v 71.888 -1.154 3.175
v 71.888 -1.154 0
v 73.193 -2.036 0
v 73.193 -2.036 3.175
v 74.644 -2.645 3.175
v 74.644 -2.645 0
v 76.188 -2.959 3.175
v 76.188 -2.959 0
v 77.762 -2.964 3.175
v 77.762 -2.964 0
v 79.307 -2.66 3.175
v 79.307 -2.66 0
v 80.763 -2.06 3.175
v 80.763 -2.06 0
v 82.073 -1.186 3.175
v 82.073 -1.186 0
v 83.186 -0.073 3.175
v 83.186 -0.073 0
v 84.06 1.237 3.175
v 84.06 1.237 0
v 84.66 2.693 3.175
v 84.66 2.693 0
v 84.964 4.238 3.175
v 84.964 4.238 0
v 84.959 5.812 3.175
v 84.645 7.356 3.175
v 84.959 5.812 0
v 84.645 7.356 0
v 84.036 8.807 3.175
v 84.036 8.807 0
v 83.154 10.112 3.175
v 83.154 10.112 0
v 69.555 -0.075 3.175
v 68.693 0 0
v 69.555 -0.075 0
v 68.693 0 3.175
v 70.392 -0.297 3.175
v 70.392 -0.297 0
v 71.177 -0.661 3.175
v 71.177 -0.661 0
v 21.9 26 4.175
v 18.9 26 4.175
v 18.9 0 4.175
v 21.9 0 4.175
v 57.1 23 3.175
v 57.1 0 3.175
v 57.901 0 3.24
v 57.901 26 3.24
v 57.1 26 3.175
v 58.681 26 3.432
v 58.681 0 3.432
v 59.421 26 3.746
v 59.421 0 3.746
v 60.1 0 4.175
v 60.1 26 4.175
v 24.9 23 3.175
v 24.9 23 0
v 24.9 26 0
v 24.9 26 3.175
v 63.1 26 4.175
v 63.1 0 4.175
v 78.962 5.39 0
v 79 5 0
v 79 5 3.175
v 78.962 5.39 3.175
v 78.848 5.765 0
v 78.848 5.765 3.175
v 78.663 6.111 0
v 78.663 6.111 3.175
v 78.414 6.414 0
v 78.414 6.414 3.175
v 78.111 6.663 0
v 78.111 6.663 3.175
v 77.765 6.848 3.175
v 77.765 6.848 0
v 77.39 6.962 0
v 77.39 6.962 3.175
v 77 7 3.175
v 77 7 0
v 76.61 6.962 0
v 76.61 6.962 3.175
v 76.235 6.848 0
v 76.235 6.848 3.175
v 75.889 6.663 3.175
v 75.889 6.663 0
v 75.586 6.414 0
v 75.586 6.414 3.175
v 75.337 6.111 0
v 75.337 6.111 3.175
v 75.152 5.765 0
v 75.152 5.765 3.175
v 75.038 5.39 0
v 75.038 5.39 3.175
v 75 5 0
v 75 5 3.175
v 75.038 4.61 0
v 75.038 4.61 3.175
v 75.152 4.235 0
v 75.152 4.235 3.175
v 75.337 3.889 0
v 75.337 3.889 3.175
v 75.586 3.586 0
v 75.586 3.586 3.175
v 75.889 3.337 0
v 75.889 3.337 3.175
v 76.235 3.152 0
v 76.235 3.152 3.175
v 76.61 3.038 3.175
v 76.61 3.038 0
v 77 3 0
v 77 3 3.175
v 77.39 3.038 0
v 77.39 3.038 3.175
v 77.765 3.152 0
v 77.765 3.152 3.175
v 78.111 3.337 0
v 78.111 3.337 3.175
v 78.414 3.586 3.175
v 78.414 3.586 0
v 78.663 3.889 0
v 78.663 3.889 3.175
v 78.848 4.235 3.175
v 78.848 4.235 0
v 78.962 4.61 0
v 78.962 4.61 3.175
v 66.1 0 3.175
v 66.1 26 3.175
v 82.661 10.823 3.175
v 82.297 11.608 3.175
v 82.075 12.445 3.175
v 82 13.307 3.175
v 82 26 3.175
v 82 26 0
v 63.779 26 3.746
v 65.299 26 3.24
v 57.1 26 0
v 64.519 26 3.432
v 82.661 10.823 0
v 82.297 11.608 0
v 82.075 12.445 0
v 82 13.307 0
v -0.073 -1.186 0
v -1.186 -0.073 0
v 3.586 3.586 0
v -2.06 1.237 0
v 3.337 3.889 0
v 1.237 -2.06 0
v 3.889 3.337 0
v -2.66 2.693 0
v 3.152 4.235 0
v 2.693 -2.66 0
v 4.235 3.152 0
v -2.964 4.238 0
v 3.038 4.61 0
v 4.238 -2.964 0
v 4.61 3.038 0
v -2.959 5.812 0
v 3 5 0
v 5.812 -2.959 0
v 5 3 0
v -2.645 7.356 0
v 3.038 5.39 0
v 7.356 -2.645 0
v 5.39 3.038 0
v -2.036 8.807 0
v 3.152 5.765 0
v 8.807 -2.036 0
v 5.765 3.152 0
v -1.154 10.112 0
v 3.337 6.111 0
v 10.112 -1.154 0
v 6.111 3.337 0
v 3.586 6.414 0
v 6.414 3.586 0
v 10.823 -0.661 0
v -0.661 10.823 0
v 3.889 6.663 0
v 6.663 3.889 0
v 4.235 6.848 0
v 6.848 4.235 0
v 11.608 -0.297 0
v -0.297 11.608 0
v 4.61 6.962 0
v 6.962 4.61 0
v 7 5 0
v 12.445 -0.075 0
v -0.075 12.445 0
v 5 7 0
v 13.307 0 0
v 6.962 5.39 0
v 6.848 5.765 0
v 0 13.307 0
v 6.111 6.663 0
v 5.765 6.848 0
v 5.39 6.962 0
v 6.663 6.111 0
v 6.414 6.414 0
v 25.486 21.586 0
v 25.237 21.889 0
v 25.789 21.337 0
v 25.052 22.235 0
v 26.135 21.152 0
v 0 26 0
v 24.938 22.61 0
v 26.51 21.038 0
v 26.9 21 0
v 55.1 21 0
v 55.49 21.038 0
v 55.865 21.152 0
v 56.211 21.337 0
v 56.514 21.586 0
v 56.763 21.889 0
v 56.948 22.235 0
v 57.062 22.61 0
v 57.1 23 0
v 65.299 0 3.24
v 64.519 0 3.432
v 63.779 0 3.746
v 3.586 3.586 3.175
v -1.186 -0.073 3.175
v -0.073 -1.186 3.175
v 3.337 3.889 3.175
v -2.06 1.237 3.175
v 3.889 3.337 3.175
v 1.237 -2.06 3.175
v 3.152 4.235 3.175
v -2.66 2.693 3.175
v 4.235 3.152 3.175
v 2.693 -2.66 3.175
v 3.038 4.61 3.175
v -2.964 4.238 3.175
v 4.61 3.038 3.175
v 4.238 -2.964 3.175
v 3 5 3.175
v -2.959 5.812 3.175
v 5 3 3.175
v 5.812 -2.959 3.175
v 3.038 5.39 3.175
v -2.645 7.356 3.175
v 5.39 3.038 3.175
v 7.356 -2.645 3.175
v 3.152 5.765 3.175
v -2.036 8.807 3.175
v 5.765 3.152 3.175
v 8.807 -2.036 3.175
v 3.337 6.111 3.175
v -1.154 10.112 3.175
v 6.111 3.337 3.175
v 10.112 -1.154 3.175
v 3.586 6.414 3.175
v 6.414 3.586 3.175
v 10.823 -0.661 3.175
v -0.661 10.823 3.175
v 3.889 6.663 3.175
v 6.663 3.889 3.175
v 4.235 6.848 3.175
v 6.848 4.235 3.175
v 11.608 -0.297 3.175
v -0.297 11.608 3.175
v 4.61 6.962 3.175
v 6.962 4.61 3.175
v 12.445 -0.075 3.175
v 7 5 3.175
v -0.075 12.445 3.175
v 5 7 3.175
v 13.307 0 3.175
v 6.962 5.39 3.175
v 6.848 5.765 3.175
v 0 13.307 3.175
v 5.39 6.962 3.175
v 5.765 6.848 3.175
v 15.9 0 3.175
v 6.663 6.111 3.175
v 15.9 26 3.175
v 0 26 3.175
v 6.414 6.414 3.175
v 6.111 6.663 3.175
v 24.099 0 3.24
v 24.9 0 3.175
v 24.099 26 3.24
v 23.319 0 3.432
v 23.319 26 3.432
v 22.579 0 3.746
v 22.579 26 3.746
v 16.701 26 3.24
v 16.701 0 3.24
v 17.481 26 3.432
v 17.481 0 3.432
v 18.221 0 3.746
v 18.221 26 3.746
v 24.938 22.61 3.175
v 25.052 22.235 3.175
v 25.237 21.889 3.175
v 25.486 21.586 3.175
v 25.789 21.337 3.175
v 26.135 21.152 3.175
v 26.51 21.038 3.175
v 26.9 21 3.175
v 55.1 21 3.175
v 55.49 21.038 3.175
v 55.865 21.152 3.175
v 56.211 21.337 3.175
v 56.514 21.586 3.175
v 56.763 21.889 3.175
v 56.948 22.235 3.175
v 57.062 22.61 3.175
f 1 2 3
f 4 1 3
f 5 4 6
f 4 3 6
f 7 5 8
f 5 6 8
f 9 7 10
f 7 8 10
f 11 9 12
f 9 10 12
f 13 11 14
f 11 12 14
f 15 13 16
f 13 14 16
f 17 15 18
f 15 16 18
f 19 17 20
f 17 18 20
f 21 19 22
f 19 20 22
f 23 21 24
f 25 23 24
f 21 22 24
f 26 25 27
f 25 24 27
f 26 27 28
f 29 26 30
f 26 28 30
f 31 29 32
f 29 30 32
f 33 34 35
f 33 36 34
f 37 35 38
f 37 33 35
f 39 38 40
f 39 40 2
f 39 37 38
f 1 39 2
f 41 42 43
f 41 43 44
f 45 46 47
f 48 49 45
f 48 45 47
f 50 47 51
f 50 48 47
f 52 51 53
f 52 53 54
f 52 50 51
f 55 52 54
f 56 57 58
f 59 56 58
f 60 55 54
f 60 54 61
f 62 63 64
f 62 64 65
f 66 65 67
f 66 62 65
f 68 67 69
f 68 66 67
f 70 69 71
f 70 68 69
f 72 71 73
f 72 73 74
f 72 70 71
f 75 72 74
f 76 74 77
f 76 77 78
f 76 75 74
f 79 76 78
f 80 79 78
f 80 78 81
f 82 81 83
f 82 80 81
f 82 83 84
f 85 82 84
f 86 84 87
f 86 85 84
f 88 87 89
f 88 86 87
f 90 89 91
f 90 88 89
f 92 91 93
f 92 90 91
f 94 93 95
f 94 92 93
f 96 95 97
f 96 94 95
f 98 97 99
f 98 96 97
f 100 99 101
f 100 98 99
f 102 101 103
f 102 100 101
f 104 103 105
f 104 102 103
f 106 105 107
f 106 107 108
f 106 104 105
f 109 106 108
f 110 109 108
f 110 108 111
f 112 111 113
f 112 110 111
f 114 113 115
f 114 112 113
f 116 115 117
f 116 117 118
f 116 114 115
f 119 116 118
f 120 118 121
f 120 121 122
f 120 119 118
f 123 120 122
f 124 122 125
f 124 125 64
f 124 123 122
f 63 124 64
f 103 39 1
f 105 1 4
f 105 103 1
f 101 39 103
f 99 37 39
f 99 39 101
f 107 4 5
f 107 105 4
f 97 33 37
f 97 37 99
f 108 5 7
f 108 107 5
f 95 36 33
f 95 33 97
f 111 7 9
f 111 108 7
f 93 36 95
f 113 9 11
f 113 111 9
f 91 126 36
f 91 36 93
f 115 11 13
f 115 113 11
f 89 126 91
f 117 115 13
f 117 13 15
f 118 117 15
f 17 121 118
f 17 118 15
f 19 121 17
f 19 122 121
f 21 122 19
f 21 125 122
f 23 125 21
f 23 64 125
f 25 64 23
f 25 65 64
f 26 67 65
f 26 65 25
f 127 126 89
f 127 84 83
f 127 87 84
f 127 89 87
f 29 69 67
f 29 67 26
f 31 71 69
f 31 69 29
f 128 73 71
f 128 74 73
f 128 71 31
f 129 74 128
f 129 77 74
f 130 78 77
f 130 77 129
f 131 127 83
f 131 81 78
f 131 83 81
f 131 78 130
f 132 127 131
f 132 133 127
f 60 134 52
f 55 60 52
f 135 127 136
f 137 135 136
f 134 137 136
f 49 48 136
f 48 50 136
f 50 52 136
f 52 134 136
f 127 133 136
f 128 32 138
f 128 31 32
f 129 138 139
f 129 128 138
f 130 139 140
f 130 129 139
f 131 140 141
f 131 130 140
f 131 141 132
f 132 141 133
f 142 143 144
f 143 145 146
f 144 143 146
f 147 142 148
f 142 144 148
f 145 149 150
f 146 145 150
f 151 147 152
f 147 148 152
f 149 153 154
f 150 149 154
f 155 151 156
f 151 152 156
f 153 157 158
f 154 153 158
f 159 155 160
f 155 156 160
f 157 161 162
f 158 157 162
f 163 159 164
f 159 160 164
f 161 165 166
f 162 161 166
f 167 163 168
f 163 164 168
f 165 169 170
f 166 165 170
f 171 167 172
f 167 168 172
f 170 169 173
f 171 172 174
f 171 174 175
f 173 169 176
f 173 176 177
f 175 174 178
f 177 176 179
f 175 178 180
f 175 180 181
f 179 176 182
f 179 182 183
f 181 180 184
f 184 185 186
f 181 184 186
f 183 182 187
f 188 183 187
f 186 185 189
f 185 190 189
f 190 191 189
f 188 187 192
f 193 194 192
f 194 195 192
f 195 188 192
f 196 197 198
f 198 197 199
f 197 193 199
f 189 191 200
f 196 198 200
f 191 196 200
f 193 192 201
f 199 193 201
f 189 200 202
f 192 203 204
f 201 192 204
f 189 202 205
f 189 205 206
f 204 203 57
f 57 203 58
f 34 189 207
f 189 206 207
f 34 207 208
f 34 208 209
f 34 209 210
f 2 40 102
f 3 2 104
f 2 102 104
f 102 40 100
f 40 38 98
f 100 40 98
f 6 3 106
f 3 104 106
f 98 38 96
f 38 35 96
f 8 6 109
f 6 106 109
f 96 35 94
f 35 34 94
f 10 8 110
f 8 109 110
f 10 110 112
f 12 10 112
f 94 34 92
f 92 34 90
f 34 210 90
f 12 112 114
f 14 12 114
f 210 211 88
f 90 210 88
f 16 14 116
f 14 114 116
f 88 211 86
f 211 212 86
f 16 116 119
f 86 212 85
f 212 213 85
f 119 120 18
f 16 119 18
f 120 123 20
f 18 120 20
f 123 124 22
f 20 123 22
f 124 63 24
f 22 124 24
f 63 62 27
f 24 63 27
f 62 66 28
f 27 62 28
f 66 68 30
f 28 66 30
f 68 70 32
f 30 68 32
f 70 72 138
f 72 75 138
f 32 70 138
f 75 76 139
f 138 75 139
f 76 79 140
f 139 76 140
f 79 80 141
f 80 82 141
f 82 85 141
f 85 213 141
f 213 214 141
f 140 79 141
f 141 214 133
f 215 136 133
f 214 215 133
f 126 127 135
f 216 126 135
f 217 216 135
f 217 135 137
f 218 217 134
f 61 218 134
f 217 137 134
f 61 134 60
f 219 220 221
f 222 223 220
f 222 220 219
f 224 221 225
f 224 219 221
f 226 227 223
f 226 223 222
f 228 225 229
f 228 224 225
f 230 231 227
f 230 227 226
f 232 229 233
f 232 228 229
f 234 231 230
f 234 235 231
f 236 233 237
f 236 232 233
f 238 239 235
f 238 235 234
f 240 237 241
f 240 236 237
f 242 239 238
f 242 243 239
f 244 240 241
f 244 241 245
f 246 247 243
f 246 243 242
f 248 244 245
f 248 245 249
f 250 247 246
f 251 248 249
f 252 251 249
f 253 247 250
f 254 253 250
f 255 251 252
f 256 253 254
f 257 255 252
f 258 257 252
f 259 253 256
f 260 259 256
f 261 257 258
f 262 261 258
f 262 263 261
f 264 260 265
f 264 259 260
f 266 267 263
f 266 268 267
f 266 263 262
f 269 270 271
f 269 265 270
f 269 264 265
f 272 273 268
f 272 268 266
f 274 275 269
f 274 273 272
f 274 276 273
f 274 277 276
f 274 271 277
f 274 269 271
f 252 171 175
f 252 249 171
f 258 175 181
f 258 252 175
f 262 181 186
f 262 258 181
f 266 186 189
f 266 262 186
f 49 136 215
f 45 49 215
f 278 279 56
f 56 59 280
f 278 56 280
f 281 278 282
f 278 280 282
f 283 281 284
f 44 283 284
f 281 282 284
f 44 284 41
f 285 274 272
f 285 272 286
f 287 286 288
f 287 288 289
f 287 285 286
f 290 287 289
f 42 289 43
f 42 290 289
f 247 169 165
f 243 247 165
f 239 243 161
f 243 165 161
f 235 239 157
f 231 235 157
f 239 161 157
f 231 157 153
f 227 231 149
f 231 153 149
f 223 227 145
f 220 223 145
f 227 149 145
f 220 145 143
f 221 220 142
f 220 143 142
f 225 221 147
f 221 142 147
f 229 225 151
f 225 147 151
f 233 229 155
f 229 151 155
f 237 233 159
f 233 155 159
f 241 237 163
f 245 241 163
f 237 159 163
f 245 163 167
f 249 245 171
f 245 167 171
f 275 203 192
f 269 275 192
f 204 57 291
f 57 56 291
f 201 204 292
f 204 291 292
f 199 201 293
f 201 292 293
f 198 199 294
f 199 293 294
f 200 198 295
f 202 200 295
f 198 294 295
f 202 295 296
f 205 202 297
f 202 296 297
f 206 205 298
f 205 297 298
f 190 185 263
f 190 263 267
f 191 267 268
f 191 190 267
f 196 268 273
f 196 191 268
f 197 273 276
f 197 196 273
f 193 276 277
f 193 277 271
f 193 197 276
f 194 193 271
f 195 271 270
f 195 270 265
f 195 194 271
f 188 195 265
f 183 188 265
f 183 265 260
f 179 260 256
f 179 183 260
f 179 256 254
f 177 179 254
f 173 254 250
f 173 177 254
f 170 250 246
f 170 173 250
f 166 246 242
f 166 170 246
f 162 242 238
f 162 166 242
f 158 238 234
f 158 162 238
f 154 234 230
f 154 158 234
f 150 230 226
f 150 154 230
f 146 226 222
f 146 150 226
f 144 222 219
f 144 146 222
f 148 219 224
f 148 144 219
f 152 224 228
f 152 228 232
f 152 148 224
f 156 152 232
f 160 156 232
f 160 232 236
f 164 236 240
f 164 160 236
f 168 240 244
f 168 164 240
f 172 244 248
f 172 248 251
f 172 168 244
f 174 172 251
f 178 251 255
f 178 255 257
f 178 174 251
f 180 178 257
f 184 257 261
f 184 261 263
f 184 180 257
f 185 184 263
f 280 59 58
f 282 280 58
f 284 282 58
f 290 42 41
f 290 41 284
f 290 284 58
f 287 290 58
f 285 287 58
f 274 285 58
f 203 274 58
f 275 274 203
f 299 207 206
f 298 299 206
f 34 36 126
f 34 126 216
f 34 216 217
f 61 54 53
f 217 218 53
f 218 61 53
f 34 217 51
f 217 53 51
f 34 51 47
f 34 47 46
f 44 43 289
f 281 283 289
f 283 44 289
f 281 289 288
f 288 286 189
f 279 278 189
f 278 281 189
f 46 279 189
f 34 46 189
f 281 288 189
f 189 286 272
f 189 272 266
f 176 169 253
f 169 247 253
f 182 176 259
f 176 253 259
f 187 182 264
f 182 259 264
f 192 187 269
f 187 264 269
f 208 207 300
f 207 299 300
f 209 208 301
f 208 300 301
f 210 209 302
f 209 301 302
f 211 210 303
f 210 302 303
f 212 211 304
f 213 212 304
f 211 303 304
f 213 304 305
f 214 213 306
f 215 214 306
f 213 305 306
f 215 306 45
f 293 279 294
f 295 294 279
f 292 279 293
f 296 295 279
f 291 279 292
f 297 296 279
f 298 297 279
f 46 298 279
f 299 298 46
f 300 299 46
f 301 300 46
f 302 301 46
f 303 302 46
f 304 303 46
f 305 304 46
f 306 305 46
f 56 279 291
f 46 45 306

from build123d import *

# Parameters (mm, degrees)
F0_R        = 2
F1_DEPTH    = 3.175
F2_R        = 5
F3_R        = 2
F4_W        = 3
F4_H        = 26
F5_DEPTH    = 1
F6_T1_DEPTH = 26


# Not quite as in the source:
# - a fillet or chamfer that OpenCascade refuses, or shapes differently, is made with other operations: its cross-section is extruded or revolved along the edge and cut away or added


with BuildPart() as f1:
    # F0 (on Top) → F1 (new body)
    with BuildSketch(Plane.XY):
        with BuildLine():
            Line((11.2449979984, 0), (0, 0))
            Line((0, 0), (0, 11.2449979984))
            ThreePointArc((0, 11.2449979984), (-0.6568542495, -0.6568542495), (11.2449979984, 0))
        make_face()
        Polygon((0, 11.2449979984), (0, 0), (11.2449979984, 0), (41, 0), (70.7550020016, 0), (82, 0), (82, 11.2449979984), (82, 26), (57.1, 26), (57.1, 21), (41, 21), (24.9, 21), (24.9, 26), (0, 26), align=None)
        with Locations((5, 5)):
            Circle(F0_R, mode=Mode.SUBTRACT)
        with Locations((77, 5)):
            Circle(F0_R, mode=Mode.SUBTRACT)
        with BuildLine():
            Line((82, 0), (70.7550020016, 0))
            ThreePointArc((70.7550020016, 0), (82.6568542495, -0.6568542495), (82, 11.2449979984))
            Line((82, 11.2449979984), (82, 0))
        make_face()
    extrude(amount=F1_DEPTH)

    # F2
    f2_edges = [f1.edges().sort_by_distance(p)[0] for p in [
        (11.244998, 0, 1.5875),
        (70.755002, 0, 1.5875),
        (82, 11.244998, 1.5875),
        (0, 11.244998, 1.5875),
    ]]
    fillet(f2_edges, radius=F2_R)

    # F3
    f3_edges = [f1.edges().sort_by_distance(p)[0] for p in [
        (24.9, 21, 1.5875),
        (57.1, 21, 1.5875),
    ]]
    fillet(f3_edges, radius=F3_R)

    # F4 (on face) → F5 (join)
    with BuildSketch(Plane.XY.offset(3.175)):
        with Locations((20.4, 13)):
            Rectangle(F4_W, F4_H)
        with Locations((61.6, 13)):
            Rectangle(F4_W, F4_H)
    extrude(amount=F5_DEPTH)

    # F6: fillet of radius 5 on 4 edges, made by hand

    # F6_s2 → F6_t1 (join)
    with BuildSketch(Plane.XZ.offset(-26)):
        with BuildLine():
            ThreePointArc((15.9, 3.175), (17.4811388301, 3.4315835097), (18.9, 4.175))
            Line((18.9, 4.175), (18.96, 4.095))
            ThreePointArc((18.96, 4.095), (19, 3.675), (19, 3.175))
            Line((19, 3.175), (18.9, 3.075))
            Line((18.9, 3.075), (15.9, 3.075))
            Line((15.9, 3.075), (15.9, 3.175))
        make_face()
        with BuildLine():
            ThreePointArc((24.9, 3.175), (23.3188611699, 3.4315835097), (21.9, 4.175))
            Line((21.9, 4.175), (21.84, 4.095))
            ThreePointArc((21.84, 4.095), (21.8, 3.675), (21.8, 3.175))
            Line((21.8, 3.175), (21.9, 3.075))
            Line((21.9, 3.075), (24.9, 3.075))
            Line((24.9, 3.075), (24.9, 3.175))
        make_face()
        with BuildLine():
            ThreePointArc((57.1, 3.175), (58.6811388301, 3.4315835097), (60.1, 4.175))
            Line((60.1, 4.175), (60.16, 4.095))
            ThreePointArc((60.16, 4.095), (60.2, 3.675), (60.2, 3.175))
            Line((60.2, 3.175), (60.1, 3.075))
            Line((60.1, 3.075), (57.1, 3.075))
            Line((57.1, 3.075), (57.1, 3.175))
        make_face()
        with BuildLine():
            ThreePointArc((66.1, 3.175), (64.5188611699, 3.4315835097), (63.1, 4.175))
            Line((63.1, 4.175), (63.04, 4.095))
            ThreePointArc((63.04, 4.095), (63, 3.675), (63, 3.175))
            Line((63, 3.175), (63.1, 3.075))
            Line((63.1, 3.075), (66.1, 3.075))
            Line((66.1, 3.075), (66.1, 3.175))
        make_face()
    extrude(amount=F6_T1_DEPTH)


solid = f1.part
